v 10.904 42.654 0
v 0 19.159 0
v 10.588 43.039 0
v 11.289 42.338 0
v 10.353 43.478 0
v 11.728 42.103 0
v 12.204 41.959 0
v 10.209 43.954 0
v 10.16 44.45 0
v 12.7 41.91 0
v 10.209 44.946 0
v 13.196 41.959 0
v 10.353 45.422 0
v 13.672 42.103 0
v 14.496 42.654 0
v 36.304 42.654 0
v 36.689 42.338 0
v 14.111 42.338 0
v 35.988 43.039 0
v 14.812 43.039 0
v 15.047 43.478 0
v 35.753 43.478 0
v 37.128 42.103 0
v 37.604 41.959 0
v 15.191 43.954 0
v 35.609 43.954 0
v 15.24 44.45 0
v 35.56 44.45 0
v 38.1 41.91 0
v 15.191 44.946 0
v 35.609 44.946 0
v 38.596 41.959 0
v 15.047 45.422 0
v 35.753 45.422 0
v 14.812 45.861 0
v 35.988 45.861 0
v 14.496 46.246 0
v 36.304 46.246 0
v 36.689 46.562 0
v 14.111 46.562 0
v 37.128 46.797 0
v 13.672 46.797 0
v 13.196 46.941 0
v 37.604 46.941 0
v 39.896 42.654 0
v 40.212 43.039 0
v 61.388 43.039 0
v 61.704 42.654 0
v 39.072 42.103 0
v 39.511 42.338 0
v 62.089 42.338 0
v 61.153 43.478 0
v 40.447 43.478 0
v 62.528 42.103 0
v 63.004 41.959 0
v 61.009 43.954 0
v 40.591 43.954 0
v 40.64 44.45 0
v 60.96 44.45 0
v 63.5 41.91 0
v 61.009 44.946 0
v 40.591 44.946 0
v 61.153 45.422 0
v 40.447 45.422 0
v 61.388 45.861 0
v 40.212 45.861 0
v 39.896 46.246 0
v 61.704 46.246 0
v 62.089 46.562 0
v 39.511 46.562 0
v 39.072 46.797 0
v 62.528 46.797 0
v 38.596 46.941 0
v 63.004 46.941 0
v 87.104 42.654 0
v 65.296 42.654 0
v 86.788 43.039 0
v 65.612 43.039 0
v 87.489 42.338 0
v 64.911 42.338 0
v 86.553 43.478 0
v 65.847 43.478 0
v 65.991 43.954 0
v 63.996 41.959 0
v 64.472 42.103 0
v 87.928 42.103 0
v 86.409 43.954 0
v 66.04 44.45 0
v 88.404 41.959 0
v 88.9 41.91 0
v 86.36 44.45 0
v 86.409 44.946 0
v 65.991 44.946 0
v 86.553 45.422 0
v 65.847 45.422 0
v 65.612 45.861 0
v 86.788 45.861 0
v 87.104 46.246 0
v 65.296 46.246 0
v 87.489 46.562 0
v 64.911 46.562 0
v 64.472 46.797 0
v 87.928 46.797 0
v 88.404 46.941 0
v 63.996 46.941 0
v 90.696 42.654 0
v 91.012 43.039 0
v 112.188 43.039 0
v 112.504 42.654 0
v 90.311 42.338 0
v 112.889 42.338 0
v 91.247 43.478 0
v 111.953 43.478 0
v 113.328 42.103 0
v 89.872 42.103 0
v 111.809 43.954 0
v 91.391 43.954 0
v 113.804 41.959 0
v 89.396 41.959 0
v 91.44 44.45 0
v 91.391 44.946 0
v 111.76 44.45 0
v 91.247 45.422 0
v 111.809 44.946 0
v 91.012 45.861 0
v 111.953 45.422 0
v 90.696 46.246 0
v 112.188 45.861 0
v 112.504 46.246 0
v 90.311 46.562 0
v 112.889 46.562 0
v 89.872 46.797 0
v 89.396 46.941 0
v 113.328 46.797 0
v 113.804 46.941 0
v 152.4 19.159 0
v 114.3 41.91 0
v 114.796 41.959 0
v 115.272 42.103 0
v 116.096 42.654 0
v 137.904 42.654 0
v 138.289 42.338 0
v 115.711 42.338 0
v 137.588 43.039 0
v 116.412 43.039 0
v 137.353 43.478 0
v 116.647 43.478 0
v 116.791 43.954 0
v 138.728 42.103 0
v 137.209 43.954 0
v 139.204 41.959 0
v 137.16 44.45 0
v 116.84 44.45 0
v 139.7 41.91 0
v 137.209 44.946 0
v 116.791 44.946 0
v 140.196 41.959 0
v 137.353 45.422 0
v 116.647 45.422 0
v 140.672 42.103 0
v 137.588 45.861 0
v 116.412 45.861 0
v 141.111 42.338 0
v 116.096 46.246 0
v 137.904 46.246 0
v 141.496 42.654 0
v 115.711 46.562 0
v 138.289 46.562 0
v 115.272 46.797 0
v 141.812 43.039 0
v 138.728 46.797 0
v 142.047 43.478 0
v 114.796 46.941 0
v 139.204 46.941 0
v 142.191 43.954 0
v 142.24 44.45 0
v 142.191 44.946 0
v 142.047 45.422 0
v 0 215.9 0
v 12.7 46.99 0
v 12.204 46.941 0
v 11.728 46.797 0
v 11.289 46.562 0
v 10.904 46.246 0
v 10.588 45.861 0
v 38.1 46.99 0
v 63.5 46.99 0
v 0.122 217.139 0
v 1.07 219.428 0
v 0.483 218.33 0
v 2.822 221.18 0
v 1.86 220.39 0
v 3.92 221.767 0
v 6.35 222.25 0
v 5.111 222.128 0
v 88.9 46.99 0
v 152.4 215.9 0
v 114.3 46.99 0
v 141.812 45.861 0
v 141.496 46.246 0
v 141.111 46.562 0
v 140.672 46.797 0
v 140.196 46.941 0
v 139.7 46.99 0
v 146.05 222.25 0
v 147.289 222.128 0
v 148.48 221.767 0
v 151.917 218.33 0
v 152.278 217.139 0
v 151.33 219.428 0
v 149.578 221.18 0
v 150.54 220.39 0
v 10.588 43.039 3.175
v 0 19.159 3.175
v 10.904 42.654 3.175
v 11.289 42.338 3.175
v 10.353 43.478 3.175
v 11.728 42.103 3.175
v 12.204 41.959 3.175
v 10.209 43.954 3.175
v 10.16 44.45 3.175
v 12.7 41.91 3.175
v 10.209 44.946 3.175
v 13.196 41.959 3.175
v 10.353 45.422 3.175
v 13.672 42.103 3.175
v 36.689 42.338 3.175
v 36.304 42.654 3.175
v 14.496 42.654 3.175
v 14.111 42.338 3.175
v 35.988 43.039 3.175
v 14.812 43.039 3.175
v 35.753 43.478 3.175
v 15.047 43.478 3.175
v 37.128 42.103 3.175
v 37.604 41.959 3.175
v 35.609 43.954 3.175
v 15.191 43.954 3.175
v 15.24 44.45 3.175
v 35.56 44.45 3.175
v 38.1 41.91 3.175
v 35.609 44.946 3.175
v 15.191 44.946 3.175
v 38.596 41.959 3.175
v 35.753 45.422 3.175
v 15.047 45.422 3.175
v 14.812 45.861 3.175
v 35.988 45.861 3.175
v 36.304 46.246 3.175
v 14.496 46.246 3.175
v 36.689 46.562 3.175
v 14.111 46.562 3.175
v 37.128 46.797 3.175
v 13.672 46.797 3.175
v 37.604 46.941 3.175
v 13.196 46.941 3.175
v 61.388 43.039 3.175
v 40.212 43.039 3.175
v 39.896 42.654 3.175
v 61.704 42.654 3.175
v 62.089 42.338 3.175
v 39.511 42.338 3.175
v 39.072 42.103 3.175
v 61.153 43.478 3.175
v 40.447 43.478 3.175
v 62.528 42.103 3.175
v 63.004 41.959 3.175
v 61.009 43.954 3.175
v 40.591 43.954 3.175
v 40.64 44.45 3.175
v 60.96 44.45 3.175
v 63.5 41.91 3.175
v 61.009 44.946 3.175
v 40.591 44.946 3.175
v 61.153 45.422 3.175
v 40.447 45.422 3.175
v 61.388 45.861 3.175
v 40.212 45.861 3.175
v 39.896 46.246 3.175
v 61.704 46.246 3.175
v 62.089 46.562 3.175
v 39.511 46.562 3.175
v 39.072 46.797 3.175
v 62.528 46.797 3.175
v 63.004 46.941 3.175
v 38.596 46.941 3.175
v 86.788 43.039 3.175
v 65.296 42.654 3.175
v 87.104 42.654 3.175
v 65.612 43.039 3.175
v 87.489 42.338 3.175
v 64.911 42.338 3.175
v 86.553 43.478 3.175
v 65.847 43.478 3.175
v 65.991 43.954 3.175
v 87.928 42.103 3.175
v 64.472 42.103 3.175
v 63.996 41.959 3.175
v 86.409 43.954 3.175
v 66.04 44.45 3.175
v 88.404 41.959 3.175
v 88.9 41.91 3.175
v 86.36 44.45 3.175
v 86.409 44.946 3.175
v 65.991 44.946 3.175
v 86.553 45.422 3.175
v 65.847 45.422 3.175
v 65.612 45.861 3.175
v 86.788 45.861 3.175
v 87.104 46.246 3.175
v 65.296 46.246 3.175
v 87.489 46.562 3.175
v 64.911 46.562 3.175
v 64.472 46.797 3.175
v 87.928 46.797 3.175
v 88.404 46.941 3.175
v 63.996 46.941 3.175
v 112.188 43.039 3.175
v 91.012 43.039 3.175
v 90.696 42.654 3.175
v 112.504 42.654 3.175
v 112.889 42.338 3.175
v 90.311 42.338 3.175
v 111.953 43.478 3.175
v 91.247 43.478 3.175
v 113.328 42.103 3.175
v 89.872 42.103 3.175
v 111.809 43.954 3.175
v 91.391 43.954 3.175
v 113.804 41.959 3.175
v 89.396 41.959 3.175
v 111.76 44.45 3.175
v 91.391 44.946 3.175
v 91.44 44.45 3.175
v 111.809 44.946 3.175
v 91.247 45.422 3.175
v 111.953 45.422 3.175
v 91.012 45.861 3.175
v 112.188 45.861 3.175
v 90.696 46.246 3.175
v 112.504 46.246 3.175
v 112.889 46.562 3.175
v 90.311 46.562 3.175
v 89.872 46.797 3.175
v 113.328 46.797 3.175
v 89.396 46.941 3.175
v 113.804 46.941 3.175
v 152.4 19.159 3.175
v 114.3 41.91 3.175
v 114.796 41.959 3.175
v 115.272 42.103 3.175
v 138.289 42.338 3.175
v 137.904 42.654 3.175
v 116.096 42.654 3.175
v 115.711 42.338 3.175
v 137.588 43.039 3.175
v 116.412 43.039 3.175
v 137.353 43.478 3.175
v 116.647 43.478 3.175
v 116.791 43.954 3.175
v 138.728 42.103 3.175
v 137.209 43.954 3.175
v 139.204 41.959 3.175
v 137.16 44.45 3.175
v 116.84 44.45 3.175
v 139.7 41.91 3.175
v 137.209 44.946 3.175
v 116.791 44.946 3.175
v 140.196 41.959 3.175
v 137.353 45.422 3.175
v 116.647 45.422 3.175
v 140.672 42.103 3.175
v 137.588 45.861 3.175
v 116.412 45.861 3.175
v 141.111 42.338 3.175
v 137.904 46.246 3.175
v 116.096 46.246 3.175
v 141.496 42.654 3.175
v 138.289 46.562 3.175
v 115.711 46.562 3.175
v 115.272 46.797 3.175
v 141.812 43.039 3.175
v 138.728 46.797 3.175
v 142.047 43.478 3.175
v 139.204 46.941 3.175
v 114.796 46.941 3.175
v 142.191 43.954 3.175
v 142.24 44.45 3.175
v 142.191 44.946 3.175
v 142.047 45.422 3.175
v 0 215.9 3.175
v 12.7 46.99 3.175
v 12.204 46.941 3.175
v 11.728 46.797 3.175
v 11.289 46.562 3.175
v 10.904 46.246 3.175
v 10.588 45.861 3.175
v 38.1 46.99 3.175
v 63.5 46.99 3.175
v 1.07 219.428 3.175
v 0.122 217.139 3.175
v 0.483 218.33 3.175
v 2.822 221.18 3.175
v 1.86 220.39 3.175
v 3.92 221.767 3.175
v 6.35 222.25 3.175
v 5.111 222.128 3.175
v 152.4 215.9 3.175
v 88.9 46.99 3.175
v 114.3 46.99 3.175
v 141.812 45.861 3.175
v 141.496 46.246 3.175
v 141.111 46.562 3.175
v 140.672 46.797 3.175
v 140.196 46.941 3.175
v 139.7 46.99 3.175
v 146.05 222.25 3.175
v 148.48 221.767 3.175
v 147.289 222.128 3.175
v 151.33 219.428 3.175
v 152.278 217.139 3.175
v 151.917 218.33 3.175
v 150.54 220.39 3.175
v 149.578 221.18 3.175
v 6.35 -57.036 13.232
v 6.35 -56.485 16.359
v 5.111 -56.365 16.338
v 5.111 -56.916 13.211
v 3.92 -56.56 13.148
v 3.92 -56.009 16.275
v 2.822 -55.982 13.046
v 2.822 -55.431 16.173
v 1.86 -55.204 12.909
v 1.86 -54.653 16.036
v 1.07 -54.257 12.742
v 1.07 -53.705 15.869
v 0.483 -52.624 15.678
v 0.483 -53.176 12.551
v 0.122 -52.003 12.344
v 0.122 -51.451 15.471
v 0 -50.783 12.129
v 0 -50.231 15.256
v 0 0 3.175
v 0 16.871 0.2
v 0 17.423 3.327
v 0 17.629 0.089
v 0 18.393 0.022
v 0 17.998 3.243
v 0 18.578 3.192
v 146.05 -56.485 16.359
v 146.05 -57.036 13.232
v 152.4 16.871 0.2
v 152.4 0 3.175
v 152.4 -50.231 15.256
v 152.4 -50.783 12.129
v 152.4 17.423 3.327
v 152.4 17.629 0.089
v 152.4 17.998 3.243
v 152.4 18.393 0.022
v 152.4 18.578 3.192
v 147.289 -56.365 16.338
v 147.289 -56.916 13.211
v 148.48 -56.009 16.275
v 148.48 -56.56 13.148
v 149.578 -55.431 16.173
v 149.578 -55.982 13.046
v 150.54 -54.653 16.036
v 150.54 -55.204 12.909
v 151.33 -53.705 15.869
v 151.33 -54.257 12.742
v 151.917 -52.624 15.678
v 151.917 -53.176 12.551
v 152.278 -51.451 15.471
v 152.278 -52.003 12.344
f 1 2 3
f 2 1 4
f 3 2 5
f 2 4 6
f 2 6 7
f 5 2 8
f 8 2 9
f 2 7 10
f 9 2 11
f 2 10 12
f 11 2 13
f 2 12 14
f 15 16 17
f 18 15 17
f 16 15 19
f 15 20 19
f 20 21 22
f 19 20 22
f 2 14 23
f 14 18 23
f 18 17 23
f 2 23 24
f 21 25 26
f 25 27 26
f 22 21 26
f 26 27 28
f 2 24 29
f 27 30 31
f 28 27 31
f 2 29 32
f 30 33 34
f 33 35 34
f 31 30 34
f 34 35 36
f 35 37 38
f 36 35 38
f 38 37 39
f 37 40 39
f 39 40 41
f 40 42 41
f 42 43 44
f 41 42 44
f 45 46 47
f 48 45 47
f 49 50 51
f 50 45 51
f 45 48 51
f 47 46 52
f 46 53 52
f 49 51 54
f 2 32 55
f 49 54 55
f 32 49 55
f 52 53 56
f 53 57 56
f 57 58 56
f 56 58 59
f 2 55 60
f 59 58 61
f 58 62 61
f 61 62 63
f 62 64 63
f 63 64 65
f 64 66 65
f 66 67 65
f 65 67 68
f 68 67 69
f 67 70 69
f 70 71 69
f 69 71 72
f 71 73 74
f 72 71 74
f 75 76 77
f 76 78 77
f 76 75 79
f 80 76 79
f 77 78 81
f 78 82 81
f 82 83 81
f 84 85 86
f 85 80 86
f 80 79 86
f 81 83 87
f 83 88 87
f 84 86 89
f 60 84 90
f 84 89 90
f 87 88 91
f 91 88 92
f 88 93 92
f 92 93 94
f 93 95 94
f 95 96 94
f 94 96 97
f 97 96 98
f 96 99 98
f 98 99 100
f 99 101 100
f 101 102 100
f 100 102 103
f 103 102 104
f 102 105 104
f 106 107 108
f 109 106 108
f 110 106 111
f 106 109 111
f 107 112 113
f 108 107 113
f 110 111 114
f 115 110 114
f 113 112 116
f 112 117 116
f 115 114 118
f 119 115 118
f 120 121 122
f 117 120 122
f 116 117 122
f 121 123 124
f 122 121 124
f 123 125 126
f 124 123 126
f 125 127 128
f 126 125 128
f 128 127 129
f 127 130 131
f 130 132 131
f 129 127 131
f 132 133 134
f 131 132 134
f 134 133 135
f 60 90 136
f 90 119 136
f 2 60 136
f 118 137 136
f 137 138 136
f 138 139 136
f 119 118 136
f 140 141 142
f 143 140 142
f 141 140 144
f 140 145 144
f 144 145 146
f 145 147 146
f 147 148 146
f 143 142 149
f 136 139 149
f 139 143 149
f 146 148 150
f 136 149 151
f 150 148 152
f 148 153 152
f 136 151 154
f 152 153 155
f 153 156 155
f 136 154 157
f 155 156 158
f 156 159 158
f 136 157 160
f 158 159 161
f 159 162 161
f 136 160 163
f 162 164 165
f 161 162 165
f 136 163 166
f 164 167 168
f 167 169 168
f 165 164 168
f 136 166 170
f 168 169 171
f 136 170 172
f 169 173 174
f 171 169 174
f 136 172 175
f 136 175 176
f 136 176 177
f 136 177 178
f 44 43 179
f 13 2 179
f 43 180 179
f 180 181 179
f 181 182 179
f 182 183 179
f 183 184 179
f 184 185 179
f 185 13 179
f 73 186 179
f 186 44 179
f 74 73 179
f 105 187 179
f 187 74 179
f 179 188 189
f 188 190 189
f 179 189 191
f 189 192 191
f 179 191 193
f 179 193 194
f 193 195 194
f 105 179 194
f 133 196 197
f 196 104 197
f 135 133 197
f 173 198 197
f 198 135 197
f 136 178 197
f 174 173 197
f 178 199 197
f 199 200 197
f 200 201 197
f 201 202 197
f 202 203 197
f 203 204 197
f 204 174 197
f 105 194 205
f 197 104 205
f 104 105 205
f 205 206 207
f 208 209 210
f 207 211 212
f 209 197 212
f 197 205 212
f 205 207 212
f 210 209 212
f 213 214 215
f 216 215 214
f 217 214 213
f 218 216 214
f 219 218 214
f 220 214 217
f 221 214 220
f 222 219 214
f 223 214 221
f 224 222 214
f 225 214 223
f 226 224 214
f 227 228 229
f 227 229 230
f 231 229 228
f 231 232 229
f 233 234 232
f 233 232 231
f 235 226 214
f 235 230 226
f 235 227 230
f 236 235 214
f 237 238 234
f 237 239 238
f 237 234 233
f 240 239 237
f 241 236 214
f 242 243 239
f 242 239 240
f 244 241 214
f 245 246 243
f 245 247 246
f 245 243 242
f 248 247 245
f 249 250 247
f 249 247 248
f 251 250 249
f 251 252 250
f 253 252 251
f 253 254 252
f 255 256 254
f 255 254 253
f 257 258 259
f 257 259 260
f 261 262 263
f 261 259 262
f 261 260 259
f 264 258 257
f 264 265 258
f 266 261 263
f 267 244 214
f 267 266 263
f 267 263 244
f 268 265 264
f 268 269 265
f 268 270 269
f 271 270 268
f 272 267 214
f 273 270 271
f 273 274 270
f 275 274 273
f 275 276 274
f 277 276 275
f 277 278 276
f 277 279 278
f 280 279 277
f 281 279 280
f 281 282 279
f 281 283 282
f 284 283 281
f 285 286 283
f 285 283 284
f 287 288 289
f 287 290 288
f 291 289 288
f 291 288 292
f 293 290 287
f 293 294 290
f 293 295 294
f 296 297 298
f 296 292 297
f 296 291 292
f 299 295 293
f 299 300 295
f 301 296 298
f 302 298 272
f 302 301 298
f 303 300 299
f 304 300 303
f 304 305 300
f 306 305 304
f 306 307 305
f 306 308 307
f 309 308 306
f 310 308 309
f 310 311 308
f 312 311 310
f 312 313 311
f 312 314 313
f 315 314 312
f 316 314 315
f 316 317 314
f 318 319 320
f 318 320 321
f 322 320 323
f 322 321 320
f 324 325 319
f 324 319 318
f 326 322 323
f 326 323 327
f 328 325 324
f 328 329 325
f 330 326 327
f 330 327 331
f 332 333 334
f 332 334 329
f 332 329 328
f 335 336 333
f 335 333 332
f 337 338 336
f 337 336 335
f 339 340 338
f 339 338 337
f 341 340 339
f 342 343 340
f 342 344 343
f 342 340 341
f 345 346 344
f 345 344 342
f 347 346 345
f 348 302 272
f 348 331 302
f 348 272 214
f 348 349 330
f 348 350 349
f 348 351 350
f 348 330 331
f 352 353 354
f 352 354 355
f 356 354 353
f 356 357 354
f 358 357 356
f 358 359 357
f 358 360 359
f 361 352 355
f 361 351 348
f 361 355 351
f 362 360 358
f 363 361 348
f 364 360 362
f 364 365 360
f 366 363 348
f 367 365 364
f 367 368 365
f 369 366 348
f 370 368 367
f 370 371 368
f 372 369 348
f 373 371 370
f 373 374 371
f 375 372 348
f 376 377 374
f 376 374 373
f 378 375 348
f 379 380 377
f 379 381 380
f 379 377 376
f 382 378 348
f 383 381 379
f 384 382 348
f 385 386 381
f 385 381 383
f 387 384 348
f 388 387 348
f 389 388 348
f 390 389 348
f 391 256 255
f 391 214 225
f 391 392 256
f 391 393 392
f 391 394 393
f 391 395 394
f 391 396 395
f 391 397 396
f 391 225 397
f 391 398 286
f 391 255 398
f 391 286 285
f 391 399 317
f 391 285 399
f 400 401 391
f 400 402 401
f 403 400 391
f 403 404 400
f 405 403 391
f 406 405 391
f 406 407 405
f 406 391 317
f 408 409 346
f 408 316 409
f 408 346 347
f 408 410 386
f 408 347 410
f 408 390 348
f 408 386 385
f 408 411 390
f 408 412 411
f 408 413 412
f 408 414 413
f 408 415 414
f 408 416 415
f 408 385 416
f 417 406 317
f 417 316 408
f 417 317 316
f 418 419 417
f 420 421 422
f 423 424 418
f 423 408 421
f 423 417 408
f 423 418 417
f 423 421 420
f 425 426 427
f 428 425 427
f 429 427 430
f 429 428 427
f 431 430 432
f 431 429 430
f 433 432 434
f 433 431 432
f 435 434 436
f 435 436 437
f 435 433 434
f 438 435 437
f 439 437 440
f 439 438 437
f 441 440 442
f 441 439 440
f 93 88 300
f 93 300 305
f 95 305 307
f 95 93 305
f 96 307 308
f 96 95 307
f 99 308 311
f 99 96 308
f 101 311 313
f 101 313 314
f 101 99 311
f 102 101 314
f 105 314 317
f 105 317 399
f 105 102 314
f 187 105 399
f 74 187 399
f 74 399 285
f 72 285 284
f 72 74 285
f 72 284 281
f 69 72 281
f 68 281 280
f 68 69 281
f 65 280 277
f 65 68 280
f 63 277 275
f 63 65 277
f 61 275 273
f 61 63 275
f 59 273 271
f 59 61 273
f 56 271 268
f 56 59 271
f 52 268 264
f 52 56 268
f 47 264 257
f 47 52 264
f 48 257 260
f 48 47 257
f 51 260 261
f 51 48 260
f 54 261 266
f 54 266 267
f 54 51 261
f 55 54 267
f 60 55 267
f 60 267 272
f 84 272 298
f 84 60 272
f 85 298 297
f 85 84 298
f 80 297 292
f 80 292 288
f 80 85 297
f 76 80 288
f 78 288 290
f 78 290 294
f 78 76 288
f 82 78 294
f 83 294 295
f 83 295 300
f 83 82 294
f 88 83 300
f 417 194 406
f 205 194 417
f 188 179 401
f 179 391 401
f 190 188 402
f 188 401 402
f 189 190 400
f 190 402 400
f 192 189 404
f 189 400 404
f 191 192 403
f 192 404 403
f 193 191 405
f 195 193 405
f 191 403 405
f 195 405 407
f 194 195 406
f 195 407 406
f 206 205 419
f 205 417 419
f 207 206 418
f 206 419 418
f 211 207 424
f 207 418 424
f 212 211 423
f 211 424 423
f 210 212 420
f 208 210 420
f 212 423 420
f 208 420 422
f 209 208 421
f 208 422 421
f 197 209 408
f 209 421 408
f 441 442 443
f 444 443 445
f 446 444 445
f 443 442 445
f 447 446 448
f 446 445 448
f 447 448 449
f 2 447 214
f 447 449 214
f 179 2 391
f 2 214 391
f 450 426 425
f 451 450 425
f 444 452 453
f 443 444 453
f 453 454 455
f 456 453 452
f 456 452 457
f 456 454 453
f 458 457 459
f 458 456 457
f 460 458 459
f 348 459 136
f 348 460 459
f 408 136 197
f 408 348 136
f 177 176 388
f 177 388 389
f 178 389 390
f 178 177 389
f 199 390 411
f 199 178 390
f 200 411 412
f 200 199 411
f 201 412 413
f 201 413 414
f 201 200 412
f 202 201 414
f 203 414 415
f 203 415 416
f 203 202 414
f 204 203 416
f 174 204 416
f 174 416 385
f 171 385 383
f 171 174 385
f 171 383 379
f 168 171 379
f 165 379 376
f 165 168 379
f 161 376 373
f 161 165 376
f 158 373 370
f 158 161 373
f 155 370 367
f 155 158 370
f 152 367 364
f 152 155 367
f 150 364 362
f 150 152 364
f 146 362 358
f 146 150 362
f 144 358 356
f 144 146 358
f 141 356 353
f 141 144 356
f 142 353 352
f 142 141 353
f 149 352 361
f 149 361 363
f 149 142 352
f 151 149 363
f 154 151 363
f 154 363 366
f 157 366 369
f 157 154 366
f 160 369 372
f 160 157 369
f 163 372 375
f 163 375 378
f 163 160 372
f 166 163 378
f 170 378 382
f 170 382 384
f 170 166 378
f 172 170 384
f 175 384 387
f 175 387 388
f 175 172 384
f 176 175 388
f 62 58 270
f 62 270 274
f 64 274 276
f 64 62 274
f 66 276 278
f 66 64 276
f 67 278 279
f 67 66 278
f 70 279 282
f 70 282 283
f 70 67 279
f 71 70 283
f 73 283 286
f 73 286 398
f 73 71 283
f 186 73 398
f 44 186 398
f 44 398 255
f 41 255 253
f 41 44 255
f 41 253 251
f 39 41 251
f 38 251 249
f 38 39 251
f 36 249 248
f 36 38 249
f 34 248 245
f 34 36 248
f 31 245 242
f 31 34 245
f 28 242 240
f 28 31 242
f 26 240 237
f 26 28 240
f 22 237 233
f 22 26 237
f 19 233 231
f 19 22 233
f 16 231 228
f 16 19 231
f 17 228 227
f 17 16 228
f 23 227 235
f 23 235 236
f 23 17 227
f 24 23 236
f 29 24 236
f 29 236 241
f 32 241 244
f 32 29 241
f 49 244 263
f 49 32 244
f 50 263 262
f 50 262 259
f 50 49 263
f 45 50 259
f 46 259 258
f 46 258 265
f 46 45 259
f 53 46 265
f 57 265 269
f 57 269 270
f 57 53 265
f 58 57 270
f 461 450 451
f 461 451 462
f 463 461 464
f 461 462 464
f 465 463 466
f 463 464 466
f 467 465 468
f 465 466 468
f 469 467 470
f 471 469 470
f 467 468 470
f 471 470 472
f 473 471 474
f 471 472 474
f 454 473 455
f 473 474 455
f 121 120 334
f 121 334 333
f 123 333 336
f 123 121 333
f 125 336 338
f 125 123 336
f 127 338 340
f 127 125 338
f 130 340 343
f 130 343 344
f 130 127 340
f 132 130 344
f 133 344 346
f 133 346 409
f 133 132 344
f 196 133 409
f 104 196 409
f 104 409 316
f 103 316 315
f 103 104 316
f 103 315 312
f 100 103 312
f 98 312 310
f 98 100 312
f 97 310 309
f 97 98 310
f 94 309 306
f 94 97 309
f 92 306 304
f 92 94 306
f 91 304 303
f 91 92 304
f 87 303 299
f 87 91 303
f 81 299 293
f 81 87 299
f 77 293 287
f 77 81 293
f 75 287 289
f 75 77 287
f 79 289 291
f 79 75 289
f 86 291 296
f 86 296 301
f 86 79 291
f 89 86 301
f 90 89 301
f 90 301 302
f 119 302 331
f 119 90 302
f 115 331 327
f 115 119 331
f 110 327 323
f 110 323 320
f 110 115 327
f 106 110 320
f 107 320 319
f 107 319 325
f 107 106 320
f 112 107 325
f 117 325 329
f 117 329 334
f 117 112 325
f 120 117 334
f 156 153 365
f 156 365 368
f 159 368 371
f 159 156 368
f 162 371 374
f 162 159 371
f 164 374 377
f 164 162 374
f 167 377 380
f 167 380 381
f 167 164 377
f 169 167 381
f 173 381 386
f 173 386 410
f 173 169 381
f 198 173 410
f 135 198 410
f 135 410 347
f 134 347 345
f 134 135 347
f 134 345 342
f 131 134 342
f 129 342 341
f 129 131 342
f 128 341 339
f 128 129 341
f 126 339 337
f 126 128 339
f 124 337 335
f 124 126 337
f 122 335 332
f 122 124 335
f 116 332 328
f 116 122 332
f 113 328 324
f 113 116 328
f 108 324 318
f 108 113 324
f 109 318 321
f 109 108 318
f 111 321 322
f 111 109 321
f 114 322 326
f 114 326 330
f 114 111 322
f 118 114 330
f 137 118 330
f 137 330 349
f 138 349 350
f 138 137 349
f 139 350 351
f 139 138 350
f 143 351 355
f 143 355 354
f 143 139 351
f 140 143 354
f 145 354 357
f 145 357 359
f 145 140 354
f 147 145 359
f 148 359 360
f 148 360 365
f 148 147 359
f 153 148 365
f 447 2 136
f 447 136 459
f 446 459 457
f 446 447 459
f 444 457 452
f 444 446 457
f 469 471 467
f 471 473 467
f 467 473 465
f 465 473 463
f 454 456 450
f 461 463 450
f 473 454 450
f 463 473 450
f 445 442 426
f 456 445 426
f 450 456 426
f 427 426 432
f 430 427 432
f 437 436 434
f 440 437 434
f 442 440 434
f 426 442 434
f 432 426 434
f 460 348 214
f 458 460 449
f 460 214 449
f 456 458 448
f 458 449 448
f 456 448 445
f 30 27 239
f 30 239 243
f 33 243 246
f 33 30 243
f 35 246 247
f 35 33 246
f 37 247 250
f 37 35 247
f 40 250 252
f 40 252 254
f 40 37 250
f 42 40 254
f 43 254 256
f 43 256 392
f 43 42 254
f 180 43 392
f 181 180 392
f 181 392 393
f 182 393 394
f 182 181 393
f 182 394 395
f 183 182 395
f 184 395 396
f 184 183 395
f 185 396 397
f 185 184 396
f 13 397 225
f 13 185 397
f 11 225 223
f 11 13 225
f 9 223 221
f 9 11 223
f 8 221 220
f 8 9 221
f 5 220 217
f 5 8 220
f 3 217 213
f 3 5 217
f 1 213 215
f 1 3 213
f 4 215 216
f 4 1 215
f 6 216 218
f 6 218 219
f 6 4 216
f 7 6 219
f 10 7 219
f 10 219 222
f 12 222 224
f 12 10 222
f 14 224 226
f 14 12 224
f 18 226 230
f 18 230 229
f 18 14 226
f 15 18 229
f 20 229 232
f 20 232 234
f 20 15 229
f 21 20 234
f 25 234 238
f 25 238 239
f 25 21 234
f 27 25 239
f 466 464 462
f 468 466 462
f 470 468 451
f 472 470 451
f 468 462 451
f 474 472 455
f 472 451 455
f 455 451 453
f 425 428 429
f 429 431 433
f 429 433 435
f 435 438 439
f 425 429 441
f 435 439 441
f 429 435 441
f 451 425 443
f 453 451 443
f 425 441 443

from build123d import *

# Parameters (mm, degrees)
SKETCH1_W            = 152.4
SKETCH1_H            = 222.25
SKETCH1_R            = 2.54
BOSS_EXTRUDE1_DEPTH  = 3.175
FILLET1_R            = 6.35
EDGE_FLANGE1_DEPTH   = 152.4
EDGE_FLANGE1_2_DEPTH = 152.4
FILLET2_R            = 6.35


# Read off the part's stored shape, not the designer's step: Edge-Flange1
with BuildPart() as part:
    # Sketch1 → Boss-Extrude1 (new body)
    with BuildSketch(Plane.XY):
        with Locations((76.2, 111.125)):
            Rectangle(SKETCH1_W, SKETCH1_H)
        with Locations((12.7, 44.45)):
            Circle(SKETCH1_R, mode=Mode.SUBTRACT)
        with Locations((38.1, 44.45)):
            Circle(SKETCH1_R, mode=Mode.SUBTRACT)
        with Locations((63.5, 44.45)):
            Circle(SKETCH1_R, mode=Mode.SUBTRACT)
        with Locations((88.9, 44.45)):
            Circle(SKETCH1_R, mode=Mode.SUBTRACT)
        with Locations((114.3, 44.45)):
            Circle(SKETCH1_R, mode=Mode.SUBTRACT)
        with Locations((139.7, 44.45)):
            Circle(SKETCH1_R, mode=Mode.SUBTRACT)
    extrude(amount=BOSS_EXTRUDE1_DEPTH)

    # Fillet1
    fillet1_edges = [part.edges().sort_by_distance(p)[0] for p in [
        (0, 222.25, 1.5875),
        (152.4, 222.25, 1.5875),
    ]]
    fillet(fillet1_edges, radius=FILLET1_R)

    # Edge-Flange1 outline → Edge-Flange1 (cut)
    with BuildSketch(Plane.YZ):
        with BuildLine():
            ThreePointArc((19.158982919, 0), (18.010706008, 0.050134853), (16.871168178, 0.200157854))
            Line((16.871168178, 0.200157854), (0, 3.175))
            Line((0, 3.175), (0, 0))
            Line((0, 0), (19.158982919, 0))
        make_face()
    extrude(amount=EDGE_FLANGE1_DEPTH, mode=Mode.SUBTRACT)

    # Edge-Flange1 2 outline → Edge-Flange1 2 (add)
    with BuildSketch(Plane.YZ):
        with BuildLine():
            Line((-57.036031002, 13.231991138), (0, 3.175))
            Line((0, 3.175), (19.158982919, 3.175))
            ThreePointArc((19.158982919, 3.175), (18.287425492, 3.213053019), (17.422501143, 3.32692247))
            Line((17.422501143, 3.32692247), (-56.484698038, 16.358755754))
            Line((-56.484698038, 16.358755754), (-57.036031002, 13.231991138))
        make_face()
    extrude(amount=EDGE_FLANGE1_2_DEPTH)

    # Fillet2
    fillet2_edges = [part.edges().sort_by_distance(p)[0] for p in [
        (0, -56.76036452, 14.795373446),
        (152.4, -56.76036452, 14.795373446),
    ]]
    fillet(fillet2_edges, radius=FILLET2_R)


solid = part.part
